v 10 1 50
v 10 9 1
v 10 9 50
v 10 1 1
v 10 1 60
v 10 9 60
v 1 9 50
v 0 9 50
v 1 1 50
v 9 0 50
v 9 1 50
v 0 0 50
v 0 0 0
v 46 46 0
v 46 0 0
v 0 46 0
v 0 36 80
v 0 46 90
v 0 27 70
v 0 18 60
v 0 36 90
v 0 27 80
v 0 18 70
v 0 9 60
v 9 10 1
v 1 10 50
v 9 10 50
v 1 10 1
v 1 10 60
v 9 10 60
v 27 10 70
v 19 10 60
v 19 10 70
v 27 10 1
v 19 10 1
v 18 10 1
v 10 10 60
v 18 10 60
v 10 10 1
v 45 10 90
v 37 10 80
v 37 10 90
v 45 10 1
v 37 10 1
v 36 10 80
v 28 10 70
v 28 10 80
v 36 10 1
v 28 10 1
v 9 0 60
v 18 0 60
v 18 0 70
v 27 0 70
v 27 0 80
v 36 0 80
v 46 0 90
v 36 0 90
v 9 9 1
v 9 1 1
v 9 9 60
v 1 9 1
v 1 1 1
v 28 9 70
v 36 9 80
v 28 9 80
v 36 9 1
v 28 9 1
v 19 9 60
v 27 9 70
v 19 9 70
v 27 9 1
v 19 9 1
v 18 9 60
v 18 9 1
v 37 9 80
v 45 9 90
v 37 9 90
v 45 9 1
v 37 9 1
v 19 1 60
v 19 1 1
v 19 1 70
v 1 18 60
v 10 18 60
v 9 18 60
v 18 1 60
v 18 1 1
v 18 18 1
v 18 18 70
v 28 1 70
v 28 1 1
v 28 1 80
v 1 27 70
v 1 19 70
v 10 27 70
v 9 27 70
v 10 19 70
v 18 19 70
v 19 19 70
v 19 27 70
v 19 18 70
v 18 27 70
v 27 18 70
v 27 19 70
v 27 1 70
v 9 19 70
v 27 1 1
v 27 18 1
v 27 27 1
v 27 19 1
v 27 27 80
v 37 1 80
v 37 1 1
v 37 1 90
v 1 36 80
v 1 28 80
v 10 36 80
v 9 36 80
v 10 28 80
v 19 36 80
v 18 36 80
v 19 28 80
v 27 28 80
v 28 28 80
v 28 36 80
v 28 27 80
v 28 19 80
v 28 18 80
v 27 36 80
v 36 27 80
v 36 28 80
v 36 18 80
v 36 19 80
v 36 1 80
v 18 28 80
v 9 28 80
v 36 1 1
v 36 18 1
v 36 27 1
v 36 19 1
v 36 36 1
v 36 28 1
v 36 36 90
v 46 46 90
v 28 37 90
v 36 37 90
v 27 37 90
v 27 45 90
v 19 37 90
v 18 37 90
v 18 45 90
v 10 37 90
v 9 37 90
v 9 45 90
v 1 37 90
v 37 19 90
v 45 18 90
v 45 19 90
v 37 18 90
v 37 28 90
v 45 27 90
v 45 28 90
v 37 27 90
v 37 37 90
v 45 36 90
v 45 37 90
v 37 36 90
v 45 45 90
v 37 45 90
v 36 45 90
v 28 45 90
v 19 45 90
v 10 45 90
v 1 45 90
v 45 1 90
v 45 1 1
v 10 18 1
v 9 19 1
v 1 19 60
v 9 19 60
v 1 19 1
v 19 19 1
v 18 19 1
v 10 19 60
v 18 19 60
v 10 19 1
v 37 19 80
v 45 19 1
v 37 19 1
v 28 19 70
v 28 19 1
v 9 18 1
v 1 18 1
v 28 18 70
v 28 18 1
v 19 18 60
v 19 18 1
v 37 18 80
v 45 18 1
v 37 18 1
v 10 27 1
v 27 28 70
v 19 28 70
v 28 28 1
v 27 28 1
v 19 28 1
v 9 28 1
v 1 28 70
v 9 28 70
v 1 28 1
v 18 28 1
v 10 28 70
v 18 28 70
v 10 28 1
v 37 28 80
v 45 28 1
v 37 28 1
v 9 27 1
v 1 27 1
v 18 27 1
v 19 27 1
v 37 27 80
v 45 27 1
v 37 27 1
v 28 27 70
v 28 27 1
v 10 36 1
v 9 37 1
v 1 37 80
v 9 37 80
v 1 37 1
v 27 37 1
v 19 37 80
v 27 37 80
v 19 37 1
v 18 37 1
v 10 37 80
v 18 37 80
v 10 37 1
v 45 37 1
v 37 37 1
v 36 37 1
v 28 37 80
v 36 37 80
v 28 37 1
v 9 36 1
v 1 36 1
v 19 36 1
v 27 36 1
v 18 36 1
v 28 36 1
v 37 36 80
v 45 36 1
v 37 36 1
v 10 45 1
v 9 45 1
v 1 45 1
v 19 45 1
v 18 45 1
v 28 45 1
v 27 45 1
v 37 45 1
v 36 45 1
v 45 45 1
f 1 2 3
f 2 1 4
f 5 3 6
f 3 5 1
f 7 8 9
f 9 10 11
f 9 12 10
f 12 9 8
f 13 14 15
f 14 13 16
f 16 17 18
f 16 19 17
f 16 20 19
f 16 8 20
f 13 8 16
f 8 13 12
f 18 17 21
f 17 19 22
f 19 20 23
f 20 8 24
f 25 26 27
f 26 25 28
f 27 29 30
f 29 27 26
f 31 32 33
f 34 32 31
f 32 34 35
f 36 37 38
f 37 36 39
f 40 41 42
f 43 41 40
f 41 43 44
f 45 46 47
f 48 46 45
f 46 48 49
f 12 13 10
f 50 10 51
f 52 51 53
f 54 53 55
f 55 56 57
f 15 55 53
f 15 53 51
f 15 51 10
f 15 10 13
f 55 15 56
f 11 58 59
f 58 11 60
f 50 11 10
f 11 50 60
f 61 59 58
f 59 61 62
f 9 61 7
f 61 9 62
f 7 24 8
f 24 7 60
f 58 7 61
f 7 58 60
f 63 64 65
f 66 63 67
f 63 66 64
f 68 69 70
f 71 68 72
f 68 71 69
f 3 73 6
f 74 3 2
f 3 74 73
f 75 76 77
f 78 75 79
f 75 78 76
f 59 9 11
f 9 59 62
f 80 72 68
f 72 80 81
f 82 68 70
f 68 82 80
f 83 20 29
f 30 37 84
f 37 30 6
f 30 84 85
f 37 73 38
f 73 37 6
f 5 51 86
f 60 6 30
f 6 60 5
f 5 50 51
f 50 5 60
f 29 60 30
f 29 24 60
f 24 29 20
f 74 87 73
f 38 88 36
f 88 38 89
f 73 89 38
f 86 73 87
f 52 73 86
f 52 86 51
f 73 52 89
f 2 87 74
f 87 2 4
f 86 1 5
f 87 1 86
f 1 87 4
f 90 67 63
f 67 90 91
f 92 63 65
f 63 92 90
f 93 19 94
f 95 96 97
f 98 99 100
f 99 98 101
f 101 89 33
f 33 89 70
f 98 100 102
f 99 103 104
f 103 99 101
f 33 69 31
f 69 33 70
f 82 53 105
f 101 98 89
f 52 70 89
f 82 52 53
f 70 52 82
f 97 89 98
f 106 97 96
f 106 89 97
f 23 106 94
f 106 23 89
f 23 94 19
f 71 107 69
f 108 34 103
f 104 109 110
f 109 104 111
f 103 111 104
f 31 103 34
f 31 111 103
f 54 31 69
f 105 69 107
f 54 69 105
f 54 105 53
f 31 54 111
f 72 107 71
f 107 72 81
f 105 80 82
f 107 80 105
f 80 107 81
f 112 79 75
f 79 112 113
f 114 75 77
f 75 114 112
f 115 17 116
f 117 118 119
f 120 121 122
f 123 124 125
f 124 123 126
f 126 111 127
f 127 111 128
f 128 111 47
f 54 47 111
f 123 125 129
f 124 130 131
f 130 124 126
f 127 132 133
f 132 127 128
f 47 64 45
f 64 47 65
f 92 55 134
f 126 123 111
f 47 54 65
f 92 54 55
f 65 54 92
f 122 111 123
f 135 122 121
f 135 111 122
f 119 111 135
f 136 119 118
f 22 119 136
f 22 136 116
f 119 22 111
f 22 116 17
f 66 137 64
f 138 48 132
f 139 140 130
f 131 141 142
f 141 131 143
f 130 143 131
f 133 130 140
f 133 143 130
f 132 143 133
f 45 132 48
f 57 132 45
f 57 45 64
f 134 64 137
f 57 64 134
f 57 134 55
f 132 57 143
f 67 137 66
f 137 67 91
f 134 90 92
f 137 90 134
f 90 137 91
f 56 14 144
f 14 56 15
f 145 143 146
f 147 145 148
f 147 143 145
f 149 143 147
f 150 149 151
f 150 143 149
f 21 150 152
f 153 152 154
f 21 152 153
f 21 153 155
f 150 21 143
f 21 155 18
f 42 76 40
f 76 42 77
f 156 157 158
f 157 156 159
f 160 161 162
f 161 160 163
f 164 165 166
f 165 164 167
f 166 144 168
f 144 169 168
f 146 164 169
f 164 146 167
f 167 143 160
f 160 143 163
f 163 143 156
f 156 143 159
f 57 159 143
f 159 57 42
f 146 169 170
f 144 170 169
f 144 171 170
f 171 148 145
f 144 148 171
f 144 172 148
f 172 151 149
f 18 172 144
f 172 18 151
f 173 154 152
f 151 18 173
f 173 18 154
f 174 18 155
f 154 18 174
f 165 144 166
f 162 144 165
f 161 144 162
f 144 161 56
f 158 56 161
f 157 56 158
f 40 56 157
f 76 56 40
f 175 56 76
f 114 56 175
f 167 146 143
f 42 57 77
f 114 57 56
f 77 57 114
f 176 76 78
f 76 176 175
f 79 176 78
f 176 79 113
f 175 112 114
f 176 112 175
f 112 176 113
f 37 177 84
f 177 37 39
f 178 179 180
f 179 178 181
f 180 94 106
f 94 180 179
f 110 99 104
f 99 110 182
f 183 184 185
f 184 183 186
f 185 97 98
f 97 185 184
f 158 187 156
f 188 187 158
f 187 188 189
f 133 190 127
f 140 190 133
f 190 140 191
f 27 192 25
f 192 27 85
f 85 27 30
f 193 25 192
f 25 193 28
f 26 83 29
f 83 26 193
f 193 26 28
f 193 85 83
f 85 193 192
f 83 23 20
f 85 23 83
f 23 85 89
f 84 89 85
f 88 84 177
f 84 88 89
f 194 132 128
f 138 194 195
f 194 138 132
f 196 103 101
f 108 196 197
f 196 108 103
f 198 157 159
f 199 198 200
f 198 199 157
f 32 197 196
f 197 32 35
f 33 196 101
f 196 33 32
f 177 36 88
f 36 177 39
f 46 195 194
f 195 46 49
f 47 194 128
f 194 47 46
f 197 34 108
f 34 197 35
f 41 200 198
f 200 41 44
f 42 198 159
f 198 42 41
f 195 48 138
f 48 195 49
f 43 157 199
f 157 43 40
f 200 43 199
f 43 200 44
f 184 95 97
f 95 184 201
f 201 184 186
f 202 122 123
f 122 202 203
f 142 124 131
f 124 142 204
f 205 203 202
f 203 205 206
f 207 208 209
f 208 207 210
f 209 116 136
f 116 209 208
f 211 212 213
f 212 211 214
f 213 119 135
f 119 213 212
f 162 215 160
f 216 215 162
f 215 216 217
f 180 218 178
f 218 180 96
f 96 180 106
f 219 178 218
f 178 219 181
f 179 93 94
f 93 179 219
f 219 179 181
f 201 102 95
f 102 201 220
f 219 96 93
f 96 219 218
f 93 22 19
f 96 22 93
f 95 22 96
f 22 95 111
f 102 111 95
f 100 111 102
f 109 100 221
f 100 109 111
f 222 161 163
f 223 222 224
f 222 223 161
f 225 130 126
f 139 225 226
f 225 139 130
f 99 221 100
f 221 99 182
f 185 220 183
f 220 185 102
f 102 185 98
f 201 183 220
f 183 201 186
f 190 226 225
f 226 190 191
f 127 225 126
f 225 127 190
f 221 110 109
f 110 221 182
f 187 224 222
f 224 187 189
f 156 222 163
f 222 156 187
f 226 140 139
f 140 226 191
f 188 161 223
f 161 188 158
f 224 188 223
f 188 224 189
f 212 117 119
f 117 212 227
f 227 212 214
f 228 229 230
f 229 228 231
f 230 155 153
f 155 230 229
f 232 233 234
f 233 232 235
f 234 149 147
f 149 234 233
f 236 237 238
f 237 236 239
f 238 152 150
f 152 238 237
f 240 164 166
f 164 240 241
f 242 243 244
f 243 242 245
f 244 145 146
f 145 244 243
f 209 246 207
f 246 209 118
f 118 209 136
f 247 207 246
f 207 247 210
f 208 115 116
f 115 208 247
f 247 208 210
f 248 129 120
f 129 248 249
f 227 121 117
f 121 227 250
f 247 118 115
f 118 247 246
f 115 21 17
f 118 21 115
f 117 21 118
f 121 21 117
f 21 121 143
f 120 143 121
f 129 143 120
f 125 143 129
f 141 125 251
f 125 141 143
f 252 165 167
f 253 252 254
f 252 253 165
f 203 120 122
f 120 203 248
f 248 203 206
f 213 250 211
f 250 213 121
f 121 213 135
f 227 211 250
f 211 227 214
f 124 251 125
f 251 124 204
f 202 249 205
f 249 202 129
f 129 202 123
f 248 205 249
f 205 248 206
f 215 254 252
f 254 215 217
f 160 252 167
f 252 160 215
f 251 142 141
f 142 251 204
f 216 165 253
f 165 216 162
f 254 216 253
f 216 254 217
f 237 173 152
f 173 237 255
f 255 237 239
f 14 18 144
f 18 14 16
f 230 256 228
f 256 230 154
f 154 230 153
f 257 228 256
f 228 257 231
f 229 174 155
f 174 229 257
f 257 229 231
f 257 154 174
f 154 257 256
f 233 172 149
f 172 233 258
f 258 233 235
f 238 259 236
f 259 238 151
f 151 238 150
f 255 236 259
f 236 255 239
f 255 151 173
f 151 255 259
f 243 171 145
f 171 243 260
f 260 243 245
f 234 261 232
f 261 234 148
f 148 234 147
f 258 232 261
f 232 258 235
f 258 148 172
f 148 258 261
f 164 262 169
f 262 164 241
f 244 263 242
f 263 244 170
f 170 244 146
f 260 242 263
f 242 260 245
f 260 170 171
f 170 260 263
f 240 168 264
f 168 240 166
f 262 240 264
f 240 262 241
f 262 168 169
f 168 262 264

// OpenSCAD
//CUSTOMIZER VARIABLES
//Hole Size
hole_size = 10; //[5:20]
//Start Height
start_height = 50; //[30:80]
//Step height
step_height = 10; //[5:20]
//Number of slots
size = 5; //[3:10]
//CUSTOMIZER VARIABLES END

for (y=[0:size-1]){
    for (x=[0:size-1]){
        translate([(hole_size-1)*x,(hole_size-1)*y,0]){
            if (x==0 && y==0){
                column(0);
            }
            for (p=[1:size]){
                if (x==p || y==p){
                    column(step_height*p);
                } 
            }            
        }
    }
}

module column(diff){
    difference(){
        cube([hole_size,hole_size,start_height+diff]);
        translate([1,1,1]){
            cube([hole_size-2,hole_size-2,start_height+diff]);
        }
    }
}
